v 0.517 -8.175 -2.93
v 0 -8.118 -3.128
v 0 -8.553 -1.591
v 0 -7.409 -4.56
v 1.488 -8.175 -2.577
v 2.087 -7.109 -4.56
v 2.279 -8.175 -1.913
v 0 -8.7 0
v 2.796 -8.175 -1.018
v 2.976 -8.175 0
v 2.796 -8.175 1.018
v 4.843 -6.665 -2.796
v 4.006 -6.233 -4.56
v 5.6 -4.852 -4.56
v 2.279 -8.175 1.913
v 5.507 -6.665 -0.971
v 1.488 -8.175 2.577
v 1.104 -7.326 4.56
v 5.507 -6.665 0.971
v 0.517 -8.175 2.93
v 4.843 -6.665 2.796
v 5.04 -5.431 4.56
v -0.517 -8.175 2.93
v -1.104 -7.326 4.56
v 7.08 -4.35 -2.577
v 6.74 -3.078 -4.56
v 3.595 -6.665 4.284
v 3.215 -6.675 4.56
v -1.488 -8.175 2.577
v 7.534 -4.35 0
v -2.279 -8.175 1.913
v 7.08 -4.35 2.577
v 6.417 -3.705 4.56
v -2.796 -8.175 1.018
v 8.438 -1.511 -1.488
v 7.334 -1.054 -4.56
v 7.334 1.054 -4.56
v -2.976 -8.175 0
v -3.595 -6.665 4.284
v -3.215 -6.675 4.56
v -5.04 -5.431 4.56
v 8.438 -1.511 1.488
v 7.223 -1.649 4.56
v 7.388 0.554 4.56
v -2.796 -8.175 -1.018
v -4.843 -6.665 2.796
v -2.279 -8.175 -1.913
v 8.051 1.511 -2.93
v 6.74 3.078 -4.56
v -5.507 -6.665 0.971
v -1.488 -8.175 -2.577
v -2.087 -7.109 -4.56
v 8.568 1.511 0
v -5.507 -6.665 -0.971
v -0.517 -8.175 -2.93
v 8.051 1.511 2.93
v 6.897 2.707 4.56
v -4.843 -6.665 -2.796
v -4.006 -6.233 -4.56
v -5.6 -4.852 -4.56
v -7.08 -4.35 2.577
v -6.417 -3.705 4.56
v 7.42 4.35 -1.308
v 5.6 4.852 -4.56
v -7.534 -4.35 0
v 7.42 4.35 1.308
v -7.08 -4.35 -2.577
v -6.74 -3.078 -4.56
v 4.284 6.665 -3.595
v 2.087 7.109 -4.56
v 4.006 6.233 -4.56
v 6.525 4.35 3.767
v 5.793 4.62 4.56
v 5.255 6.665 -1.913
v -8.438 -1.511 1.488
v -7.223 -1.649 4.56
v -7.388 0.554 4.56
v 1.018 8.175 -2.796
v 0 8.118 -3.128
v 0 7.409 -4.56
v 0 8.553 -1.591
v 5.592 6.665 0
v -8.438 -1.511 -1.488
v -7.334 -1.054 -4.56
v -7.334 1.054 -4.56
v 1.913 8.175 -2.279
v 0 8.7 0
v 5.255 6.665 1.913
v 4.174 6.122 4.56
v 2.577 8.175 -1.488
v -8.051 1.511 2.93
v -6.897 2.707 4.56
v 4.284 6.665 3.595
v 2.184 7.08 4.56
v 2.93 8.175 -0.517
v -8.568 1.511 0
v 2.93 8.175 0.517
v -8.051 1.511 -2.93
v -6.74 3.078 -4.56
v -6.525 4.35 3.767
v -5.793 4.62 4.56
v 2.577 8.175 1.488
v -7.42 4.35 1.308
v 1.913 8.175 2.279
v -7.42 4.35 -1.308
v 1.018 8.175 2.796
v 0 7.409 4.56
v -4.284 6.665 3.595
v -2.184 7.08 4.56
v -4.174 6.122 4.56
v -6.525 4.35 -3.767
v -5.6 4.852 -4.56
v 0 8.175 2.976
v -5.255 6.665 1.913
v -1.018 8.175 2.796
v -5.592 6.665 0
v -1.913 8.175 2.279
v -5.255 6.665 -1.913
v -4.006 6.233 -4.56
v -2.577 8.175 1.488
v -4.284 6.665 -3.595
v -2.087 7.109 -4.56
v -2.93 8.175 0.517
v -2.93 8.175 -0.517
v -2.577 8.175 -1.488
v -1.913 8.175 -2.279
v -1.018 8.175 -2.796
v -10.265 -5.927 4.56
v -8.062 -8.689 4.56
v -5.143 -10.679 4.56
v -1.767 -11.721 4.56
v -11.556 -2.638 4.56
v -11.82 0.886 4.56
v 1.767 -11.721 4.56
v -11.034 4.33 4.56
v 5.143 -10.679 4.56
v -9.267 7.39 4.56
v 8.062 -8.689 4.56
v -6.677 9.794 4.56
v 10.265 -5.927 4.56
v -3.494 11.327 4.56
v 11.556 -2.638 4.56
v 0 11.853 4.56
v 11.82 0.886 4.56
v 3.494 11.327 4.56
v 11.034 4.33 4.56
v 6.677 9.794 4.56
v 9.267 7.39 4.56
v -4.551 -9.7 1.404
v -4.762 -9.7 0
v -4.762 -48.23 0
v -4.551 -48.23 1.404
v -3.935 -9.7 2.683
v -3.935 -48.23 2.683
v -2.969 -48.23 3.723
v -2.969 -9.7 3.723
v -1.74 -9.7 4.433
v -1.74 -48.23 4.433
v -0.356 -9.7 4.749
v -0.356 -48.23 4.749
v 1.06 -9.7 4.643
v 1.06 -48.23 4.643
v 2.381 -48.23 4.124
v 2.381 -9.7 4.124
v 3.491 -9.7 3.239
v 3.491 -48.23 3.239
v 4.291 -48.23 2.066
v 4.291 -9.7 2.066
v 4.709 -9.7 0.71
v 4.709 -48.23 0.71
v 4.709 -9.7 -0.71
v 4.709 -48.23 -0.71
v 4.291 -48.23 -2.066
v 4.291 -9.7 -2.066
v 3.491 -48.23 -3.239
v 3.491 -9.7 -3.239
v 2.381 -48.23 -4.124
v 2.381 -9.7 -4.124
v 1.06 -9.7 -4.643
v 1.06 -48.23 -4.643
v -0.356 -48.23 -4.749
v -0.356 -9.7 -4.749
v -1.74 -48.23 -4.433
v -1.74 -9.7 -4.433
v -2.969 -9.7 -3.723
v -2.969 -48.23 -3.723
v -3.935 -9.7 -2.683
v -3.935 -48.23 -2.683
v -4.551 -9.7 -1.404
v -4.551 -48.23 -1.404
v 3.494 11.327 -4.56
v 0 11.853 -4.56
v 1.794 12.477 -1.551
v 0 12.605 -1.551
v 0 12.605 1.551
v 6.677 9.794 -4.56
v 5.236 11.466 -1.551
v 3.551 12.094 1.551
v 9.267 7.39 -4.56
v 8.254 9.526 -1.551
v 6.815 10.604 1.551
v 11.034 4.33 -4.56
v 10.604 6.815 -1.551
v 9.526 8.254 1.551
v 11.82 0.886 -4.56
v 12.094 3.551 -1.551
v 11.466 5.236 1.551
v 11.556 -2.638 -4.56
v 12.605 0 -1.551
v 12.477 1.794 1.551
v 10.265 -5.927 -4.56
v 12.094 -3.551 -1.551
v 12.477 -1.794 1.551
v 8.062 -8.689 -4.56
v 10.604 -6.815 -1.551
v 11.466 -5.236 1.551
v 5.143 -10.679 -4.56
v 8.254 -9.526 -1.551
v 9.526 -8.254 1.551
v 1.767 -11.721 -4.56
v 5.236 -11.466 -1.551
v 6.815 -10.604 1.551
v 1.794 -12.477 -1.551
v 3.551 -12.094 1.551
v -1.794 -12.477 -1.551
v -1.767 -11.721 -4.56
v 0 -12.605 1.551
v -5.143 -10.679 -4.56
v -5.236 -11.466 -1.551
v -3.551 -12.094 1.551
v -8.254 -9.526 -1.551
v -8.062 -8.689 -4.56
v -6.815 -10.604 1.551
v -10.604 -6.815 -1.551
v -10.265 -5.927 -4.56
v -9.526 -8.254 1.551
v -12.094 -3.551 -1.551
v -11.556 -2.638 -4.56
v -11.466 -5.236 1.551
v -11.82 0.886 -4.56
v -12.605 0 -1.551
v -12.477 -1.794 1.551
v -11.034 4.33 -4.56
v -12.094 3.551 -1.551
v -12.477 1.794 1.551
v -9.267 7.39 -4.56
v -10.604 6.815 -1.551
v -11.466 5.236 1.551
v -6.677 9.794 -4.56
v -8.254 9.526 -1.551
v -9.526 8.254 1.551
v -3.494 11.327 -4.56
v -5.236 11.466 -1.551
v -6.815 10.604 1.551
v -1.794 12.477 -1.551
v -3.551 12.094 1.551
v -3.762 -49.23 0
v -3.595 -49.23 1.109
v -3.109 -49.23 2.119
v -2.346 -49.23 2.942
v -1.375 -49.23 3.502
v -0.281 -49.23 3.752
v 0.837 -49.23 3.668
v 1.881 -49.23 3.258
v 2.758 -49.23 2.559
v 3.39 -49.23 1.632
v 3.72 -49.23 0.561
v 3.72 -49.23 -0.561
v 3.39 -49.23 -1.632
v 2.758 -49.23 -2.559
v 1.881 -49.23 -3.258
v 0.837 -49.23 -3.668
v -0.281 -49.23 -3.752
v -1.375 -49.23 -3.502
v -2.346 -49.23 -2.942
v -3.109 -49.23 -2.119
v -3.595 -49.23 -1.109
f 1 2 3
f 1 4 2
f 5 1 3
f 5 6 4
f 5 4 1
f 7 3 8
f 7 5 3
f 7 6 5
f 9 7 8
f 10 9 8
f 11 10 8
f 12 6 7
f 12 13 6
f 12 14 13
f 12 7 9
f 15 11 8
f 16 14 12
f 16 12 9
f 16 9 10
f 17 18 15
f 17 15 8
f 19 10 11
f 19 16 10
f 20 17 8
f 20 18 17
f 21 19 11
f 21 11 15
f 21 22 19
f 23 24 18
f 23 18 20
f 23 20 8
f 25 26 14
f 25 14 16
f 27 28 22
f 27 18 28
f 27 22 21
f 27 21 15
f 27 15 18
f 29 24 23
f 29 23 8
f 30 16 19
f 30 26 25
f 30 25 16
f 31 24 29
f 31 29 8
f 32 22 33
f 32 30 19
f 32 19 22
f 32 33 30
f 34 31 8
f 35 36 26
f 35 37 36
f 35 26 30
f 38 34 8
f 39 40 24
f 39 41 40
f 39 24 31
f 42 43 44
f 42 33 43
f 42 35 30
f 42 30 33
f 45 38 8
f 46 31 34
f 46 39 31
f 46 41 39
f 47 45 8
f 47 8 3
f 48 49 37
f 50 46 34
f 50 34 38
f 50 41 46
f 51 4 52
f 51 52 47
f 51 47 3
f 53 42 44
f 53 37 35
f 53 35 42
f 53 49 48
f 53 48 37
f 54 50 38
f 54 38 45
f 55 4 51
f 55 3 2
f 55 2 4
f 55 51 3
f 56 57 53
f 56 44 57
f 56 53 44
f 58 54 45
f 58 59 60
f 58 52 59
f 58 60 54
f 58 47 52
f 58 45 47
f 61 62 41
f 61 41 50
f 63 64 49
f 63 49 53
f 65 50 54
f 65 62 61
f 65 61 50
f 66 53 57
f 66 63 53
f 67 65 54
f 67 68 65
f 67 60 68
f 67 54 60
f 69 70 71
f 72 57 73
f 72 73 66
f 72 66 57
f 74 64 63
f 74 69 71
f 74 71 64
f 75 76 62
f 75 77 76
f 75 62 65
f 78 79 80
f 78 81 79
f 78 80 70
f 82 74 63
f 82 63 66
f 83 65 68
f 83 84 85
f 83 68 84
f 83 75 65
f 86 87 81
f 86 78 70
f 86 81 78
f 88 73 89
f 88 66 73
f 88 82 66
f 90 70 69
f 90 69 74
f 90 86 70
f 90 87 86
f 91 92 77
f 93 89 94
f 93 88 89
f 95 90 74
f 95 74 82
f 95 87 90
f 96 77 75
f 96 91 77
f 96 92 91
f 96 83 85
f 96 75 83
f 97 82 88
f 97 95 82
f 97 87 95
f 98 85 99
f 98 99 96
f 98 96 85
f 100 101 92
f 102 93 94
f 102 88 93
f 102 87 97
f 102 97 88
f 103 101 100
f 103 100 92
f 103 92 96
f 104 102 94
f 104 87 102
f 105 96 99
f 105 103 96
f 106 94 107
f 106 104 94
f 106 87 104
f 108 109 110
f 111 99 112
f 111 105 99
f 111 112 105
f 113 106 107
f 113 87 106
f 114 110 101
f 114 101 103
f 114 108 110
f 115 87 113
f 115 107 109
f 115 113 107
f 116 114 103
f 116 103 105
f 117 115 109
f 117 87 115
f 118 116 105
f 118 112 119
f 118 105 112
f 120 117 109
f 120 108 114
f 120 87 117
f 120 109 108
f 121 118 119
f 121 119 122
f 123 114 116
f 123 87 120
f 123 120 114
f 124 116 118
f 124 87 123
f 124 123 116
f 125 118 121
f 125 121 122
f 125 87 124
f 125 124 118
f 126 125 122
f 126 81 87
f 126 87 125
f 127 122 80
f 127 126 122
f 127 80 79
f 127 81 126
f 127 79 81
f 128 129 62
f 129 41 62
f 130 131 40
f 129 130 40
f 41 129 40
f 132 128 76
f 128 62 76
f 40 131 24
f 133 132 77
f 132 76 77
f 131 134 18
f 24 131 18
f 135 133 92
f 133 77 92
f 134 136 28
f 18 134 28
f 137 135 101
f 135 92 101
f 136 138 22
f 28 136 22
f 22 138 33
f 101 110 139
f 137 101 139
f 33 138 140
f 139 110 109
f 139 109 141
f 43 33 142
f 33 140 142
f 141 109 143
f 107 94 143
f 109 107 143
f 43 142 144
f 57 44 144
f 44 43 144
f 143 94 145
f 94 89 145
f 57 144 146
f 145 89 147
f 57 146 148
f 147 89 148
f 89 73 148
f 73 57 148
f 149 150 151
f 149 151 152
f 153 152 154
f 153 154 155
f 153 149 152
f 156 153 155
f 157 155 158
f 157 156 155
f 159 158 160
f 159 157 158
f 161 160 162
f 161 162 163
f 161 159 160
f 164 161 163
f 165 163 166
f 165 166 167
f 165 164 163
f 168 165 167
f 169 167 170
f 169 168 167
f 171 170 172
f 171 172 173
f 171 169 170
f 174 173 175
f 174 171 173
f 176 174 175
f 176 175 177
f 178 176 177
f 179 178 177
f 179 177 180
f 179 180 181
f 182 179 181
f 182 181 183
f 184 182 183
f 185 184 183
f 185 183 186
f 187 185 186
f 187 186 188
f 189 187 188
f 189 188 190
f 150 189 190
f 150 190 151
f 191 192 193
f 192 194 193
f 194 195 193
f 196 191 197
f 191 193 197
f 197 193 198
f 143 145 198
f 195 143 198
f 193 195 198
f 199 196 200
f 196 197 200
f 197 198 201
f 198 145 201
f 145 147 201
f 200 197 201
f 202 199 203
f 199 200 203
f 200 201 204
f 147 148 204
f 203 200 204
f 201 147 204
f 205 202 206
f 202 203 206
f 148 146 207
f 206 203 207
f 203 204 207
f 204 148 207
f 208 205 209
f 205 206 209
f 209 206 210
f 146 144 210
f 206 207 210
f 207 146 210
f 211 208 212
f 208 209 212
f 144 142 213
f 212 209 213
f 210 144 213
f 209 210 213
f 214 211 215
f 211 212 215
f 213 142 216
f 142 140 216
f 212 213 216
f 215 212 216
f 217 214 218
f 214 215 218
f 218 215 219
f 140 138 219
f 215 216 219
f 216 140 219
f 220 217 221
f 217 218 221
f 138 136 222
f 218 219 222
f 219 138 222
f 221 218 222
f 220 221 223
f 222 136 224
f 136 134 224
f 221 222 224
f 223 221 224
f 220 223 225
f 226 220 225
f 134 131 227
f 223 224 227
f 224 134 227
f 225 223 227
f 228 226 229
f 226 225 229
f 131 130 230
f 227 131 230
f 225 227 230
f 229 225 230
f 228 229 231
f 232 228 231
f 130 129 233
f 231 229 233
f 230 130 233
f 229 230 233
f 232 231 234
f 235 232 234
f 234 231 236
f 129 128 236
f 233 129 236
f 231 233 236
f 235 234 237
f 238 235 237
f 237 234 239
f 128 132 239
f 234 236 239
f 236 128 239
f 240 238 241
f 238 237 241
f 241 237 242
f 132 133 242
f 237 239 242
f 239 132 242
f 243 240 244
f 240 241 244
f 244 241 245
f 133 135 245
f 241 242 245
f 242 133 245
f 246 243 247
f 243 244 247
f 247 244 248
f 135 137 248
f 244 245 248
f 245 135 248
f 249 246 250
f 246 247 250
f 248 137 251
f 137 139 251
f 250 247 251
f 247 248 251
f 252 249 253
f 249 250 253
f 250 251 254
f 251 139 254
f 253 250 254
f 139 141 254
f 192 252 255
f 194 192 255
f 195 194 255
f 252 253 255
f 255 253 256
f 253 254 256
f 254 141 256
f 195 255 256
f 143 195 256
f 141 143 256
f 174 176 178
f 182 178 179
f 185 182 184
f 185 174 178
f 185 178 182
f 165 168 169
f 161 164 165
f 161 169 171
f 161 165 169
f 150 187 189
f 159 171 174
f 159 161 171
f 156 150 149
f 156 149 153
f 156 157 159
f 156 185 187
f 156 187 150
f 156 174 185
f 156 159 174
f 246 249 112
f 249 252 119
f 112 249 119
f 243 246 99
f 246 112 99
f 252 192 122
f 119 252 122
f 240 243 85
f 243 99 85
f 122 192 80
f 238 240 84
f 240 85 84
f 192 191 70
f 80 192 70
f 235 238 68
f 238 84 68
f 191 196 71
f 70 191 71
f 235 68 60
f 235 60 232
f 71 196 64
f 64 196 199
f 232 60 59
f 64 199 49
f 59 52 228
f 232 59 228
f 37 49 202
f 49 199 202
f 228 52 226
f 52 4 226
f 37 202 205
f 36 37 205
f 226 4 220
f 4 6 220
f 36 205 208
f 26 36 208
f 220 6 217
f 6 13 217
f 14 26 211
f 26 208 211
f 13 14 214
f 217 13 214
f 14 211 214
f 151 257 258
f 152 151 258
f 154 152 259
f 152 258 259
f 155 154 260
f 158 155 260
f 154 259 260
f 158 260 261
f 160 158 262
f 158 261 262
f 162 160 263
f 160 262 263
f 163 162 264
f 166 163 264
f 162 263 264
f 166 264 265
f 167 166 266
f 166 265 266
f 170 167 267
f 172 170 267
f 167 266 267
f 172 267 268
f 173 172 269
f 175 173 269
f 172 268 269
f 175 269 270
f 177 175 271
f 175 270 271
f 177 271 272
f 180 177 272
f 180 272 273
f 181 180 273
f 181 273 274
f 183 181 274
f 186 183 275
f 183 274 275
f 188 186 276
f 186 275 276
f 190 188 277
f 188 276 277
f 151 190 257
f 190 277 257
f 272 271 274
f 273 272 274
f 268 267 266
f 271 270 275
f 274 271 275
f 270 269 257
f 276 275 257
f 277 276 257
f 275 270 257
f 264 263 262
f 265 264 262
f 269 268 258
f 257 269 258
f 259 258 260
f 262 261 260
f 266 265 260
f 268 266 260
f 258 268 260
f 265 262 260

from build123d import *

# Parameters (mm, degrees)
SKETCH5_R           = 4.7625
EXTRUDE2_DEPTH      = 3
EXTRUDE2_DEPTH_BACK = 36.53
CHAMFER1_SIZE       = 1


with BuildPart() as part:
    # Sketch3 → Revolve2 (revolve)
    with BuildSketch(Plane(origin=(0, 0, 0), x_dir=(0, 0, -1), z_dir=(1, 0, 0))):
        with BuildLine():
            Line((-4.56, 11.853117733), (-4.56, 0))
            Line((-4.56, 0), (4.56, 0))
            Line((4.56, 0), (4.56, 11.853117733))
            ThreePointArc((4.56, 11.853117733), (0, 12.7), (-4.56, 11.853117733))
        make_face()
    revolve(axis=Axis((0, 0, 8.146649187), (0, 0, -1)))

    # Sketch2 → Cut-Revolve2 (revolve, cut)
    with BuildSketch(Plane(origin=(0, 0, 0), x_dir=(0, 0, -1), z_dir=(1, 0, 0))):
        with BuildLine():
            Line((0, 8.7), (0, -8.7))
            ThreePointArc((0, -8.7), (8.7, 0), (0, 8.7))
        make_face()
    revolve(axis=Axis((0, 15.474361319, 0), (0, -1, 0)), mode=Mode.SUBTRACT)


with BuildPart() as body_2:
    # Sketch5 → Extrude2 (new body, two sides)
    with BuildSketch(Plane(origin=(0, -12.7, 0), x_dir=(-1, 0, 0), z_dir=(0, 1, 0))) as extrude2_sk:
        Circle(SKETCH5_R)
    extrude(amount=EXTRUDE2_DEPTH)
    extrude(extrude2_sk.sketch, amount=-EXTRUDE2_DEPTH_BACK)

    # Chamfer1
    chamfer1_edges = [body_2.edges().sort_by_distance(p)[0] for p in [
        (4.7625, -49.23, 0),
    ]]
    chamfer(chamfer1_edges, length=CHAMFER1_SIZE)


solid = Compound([part.part, body_2.part])
